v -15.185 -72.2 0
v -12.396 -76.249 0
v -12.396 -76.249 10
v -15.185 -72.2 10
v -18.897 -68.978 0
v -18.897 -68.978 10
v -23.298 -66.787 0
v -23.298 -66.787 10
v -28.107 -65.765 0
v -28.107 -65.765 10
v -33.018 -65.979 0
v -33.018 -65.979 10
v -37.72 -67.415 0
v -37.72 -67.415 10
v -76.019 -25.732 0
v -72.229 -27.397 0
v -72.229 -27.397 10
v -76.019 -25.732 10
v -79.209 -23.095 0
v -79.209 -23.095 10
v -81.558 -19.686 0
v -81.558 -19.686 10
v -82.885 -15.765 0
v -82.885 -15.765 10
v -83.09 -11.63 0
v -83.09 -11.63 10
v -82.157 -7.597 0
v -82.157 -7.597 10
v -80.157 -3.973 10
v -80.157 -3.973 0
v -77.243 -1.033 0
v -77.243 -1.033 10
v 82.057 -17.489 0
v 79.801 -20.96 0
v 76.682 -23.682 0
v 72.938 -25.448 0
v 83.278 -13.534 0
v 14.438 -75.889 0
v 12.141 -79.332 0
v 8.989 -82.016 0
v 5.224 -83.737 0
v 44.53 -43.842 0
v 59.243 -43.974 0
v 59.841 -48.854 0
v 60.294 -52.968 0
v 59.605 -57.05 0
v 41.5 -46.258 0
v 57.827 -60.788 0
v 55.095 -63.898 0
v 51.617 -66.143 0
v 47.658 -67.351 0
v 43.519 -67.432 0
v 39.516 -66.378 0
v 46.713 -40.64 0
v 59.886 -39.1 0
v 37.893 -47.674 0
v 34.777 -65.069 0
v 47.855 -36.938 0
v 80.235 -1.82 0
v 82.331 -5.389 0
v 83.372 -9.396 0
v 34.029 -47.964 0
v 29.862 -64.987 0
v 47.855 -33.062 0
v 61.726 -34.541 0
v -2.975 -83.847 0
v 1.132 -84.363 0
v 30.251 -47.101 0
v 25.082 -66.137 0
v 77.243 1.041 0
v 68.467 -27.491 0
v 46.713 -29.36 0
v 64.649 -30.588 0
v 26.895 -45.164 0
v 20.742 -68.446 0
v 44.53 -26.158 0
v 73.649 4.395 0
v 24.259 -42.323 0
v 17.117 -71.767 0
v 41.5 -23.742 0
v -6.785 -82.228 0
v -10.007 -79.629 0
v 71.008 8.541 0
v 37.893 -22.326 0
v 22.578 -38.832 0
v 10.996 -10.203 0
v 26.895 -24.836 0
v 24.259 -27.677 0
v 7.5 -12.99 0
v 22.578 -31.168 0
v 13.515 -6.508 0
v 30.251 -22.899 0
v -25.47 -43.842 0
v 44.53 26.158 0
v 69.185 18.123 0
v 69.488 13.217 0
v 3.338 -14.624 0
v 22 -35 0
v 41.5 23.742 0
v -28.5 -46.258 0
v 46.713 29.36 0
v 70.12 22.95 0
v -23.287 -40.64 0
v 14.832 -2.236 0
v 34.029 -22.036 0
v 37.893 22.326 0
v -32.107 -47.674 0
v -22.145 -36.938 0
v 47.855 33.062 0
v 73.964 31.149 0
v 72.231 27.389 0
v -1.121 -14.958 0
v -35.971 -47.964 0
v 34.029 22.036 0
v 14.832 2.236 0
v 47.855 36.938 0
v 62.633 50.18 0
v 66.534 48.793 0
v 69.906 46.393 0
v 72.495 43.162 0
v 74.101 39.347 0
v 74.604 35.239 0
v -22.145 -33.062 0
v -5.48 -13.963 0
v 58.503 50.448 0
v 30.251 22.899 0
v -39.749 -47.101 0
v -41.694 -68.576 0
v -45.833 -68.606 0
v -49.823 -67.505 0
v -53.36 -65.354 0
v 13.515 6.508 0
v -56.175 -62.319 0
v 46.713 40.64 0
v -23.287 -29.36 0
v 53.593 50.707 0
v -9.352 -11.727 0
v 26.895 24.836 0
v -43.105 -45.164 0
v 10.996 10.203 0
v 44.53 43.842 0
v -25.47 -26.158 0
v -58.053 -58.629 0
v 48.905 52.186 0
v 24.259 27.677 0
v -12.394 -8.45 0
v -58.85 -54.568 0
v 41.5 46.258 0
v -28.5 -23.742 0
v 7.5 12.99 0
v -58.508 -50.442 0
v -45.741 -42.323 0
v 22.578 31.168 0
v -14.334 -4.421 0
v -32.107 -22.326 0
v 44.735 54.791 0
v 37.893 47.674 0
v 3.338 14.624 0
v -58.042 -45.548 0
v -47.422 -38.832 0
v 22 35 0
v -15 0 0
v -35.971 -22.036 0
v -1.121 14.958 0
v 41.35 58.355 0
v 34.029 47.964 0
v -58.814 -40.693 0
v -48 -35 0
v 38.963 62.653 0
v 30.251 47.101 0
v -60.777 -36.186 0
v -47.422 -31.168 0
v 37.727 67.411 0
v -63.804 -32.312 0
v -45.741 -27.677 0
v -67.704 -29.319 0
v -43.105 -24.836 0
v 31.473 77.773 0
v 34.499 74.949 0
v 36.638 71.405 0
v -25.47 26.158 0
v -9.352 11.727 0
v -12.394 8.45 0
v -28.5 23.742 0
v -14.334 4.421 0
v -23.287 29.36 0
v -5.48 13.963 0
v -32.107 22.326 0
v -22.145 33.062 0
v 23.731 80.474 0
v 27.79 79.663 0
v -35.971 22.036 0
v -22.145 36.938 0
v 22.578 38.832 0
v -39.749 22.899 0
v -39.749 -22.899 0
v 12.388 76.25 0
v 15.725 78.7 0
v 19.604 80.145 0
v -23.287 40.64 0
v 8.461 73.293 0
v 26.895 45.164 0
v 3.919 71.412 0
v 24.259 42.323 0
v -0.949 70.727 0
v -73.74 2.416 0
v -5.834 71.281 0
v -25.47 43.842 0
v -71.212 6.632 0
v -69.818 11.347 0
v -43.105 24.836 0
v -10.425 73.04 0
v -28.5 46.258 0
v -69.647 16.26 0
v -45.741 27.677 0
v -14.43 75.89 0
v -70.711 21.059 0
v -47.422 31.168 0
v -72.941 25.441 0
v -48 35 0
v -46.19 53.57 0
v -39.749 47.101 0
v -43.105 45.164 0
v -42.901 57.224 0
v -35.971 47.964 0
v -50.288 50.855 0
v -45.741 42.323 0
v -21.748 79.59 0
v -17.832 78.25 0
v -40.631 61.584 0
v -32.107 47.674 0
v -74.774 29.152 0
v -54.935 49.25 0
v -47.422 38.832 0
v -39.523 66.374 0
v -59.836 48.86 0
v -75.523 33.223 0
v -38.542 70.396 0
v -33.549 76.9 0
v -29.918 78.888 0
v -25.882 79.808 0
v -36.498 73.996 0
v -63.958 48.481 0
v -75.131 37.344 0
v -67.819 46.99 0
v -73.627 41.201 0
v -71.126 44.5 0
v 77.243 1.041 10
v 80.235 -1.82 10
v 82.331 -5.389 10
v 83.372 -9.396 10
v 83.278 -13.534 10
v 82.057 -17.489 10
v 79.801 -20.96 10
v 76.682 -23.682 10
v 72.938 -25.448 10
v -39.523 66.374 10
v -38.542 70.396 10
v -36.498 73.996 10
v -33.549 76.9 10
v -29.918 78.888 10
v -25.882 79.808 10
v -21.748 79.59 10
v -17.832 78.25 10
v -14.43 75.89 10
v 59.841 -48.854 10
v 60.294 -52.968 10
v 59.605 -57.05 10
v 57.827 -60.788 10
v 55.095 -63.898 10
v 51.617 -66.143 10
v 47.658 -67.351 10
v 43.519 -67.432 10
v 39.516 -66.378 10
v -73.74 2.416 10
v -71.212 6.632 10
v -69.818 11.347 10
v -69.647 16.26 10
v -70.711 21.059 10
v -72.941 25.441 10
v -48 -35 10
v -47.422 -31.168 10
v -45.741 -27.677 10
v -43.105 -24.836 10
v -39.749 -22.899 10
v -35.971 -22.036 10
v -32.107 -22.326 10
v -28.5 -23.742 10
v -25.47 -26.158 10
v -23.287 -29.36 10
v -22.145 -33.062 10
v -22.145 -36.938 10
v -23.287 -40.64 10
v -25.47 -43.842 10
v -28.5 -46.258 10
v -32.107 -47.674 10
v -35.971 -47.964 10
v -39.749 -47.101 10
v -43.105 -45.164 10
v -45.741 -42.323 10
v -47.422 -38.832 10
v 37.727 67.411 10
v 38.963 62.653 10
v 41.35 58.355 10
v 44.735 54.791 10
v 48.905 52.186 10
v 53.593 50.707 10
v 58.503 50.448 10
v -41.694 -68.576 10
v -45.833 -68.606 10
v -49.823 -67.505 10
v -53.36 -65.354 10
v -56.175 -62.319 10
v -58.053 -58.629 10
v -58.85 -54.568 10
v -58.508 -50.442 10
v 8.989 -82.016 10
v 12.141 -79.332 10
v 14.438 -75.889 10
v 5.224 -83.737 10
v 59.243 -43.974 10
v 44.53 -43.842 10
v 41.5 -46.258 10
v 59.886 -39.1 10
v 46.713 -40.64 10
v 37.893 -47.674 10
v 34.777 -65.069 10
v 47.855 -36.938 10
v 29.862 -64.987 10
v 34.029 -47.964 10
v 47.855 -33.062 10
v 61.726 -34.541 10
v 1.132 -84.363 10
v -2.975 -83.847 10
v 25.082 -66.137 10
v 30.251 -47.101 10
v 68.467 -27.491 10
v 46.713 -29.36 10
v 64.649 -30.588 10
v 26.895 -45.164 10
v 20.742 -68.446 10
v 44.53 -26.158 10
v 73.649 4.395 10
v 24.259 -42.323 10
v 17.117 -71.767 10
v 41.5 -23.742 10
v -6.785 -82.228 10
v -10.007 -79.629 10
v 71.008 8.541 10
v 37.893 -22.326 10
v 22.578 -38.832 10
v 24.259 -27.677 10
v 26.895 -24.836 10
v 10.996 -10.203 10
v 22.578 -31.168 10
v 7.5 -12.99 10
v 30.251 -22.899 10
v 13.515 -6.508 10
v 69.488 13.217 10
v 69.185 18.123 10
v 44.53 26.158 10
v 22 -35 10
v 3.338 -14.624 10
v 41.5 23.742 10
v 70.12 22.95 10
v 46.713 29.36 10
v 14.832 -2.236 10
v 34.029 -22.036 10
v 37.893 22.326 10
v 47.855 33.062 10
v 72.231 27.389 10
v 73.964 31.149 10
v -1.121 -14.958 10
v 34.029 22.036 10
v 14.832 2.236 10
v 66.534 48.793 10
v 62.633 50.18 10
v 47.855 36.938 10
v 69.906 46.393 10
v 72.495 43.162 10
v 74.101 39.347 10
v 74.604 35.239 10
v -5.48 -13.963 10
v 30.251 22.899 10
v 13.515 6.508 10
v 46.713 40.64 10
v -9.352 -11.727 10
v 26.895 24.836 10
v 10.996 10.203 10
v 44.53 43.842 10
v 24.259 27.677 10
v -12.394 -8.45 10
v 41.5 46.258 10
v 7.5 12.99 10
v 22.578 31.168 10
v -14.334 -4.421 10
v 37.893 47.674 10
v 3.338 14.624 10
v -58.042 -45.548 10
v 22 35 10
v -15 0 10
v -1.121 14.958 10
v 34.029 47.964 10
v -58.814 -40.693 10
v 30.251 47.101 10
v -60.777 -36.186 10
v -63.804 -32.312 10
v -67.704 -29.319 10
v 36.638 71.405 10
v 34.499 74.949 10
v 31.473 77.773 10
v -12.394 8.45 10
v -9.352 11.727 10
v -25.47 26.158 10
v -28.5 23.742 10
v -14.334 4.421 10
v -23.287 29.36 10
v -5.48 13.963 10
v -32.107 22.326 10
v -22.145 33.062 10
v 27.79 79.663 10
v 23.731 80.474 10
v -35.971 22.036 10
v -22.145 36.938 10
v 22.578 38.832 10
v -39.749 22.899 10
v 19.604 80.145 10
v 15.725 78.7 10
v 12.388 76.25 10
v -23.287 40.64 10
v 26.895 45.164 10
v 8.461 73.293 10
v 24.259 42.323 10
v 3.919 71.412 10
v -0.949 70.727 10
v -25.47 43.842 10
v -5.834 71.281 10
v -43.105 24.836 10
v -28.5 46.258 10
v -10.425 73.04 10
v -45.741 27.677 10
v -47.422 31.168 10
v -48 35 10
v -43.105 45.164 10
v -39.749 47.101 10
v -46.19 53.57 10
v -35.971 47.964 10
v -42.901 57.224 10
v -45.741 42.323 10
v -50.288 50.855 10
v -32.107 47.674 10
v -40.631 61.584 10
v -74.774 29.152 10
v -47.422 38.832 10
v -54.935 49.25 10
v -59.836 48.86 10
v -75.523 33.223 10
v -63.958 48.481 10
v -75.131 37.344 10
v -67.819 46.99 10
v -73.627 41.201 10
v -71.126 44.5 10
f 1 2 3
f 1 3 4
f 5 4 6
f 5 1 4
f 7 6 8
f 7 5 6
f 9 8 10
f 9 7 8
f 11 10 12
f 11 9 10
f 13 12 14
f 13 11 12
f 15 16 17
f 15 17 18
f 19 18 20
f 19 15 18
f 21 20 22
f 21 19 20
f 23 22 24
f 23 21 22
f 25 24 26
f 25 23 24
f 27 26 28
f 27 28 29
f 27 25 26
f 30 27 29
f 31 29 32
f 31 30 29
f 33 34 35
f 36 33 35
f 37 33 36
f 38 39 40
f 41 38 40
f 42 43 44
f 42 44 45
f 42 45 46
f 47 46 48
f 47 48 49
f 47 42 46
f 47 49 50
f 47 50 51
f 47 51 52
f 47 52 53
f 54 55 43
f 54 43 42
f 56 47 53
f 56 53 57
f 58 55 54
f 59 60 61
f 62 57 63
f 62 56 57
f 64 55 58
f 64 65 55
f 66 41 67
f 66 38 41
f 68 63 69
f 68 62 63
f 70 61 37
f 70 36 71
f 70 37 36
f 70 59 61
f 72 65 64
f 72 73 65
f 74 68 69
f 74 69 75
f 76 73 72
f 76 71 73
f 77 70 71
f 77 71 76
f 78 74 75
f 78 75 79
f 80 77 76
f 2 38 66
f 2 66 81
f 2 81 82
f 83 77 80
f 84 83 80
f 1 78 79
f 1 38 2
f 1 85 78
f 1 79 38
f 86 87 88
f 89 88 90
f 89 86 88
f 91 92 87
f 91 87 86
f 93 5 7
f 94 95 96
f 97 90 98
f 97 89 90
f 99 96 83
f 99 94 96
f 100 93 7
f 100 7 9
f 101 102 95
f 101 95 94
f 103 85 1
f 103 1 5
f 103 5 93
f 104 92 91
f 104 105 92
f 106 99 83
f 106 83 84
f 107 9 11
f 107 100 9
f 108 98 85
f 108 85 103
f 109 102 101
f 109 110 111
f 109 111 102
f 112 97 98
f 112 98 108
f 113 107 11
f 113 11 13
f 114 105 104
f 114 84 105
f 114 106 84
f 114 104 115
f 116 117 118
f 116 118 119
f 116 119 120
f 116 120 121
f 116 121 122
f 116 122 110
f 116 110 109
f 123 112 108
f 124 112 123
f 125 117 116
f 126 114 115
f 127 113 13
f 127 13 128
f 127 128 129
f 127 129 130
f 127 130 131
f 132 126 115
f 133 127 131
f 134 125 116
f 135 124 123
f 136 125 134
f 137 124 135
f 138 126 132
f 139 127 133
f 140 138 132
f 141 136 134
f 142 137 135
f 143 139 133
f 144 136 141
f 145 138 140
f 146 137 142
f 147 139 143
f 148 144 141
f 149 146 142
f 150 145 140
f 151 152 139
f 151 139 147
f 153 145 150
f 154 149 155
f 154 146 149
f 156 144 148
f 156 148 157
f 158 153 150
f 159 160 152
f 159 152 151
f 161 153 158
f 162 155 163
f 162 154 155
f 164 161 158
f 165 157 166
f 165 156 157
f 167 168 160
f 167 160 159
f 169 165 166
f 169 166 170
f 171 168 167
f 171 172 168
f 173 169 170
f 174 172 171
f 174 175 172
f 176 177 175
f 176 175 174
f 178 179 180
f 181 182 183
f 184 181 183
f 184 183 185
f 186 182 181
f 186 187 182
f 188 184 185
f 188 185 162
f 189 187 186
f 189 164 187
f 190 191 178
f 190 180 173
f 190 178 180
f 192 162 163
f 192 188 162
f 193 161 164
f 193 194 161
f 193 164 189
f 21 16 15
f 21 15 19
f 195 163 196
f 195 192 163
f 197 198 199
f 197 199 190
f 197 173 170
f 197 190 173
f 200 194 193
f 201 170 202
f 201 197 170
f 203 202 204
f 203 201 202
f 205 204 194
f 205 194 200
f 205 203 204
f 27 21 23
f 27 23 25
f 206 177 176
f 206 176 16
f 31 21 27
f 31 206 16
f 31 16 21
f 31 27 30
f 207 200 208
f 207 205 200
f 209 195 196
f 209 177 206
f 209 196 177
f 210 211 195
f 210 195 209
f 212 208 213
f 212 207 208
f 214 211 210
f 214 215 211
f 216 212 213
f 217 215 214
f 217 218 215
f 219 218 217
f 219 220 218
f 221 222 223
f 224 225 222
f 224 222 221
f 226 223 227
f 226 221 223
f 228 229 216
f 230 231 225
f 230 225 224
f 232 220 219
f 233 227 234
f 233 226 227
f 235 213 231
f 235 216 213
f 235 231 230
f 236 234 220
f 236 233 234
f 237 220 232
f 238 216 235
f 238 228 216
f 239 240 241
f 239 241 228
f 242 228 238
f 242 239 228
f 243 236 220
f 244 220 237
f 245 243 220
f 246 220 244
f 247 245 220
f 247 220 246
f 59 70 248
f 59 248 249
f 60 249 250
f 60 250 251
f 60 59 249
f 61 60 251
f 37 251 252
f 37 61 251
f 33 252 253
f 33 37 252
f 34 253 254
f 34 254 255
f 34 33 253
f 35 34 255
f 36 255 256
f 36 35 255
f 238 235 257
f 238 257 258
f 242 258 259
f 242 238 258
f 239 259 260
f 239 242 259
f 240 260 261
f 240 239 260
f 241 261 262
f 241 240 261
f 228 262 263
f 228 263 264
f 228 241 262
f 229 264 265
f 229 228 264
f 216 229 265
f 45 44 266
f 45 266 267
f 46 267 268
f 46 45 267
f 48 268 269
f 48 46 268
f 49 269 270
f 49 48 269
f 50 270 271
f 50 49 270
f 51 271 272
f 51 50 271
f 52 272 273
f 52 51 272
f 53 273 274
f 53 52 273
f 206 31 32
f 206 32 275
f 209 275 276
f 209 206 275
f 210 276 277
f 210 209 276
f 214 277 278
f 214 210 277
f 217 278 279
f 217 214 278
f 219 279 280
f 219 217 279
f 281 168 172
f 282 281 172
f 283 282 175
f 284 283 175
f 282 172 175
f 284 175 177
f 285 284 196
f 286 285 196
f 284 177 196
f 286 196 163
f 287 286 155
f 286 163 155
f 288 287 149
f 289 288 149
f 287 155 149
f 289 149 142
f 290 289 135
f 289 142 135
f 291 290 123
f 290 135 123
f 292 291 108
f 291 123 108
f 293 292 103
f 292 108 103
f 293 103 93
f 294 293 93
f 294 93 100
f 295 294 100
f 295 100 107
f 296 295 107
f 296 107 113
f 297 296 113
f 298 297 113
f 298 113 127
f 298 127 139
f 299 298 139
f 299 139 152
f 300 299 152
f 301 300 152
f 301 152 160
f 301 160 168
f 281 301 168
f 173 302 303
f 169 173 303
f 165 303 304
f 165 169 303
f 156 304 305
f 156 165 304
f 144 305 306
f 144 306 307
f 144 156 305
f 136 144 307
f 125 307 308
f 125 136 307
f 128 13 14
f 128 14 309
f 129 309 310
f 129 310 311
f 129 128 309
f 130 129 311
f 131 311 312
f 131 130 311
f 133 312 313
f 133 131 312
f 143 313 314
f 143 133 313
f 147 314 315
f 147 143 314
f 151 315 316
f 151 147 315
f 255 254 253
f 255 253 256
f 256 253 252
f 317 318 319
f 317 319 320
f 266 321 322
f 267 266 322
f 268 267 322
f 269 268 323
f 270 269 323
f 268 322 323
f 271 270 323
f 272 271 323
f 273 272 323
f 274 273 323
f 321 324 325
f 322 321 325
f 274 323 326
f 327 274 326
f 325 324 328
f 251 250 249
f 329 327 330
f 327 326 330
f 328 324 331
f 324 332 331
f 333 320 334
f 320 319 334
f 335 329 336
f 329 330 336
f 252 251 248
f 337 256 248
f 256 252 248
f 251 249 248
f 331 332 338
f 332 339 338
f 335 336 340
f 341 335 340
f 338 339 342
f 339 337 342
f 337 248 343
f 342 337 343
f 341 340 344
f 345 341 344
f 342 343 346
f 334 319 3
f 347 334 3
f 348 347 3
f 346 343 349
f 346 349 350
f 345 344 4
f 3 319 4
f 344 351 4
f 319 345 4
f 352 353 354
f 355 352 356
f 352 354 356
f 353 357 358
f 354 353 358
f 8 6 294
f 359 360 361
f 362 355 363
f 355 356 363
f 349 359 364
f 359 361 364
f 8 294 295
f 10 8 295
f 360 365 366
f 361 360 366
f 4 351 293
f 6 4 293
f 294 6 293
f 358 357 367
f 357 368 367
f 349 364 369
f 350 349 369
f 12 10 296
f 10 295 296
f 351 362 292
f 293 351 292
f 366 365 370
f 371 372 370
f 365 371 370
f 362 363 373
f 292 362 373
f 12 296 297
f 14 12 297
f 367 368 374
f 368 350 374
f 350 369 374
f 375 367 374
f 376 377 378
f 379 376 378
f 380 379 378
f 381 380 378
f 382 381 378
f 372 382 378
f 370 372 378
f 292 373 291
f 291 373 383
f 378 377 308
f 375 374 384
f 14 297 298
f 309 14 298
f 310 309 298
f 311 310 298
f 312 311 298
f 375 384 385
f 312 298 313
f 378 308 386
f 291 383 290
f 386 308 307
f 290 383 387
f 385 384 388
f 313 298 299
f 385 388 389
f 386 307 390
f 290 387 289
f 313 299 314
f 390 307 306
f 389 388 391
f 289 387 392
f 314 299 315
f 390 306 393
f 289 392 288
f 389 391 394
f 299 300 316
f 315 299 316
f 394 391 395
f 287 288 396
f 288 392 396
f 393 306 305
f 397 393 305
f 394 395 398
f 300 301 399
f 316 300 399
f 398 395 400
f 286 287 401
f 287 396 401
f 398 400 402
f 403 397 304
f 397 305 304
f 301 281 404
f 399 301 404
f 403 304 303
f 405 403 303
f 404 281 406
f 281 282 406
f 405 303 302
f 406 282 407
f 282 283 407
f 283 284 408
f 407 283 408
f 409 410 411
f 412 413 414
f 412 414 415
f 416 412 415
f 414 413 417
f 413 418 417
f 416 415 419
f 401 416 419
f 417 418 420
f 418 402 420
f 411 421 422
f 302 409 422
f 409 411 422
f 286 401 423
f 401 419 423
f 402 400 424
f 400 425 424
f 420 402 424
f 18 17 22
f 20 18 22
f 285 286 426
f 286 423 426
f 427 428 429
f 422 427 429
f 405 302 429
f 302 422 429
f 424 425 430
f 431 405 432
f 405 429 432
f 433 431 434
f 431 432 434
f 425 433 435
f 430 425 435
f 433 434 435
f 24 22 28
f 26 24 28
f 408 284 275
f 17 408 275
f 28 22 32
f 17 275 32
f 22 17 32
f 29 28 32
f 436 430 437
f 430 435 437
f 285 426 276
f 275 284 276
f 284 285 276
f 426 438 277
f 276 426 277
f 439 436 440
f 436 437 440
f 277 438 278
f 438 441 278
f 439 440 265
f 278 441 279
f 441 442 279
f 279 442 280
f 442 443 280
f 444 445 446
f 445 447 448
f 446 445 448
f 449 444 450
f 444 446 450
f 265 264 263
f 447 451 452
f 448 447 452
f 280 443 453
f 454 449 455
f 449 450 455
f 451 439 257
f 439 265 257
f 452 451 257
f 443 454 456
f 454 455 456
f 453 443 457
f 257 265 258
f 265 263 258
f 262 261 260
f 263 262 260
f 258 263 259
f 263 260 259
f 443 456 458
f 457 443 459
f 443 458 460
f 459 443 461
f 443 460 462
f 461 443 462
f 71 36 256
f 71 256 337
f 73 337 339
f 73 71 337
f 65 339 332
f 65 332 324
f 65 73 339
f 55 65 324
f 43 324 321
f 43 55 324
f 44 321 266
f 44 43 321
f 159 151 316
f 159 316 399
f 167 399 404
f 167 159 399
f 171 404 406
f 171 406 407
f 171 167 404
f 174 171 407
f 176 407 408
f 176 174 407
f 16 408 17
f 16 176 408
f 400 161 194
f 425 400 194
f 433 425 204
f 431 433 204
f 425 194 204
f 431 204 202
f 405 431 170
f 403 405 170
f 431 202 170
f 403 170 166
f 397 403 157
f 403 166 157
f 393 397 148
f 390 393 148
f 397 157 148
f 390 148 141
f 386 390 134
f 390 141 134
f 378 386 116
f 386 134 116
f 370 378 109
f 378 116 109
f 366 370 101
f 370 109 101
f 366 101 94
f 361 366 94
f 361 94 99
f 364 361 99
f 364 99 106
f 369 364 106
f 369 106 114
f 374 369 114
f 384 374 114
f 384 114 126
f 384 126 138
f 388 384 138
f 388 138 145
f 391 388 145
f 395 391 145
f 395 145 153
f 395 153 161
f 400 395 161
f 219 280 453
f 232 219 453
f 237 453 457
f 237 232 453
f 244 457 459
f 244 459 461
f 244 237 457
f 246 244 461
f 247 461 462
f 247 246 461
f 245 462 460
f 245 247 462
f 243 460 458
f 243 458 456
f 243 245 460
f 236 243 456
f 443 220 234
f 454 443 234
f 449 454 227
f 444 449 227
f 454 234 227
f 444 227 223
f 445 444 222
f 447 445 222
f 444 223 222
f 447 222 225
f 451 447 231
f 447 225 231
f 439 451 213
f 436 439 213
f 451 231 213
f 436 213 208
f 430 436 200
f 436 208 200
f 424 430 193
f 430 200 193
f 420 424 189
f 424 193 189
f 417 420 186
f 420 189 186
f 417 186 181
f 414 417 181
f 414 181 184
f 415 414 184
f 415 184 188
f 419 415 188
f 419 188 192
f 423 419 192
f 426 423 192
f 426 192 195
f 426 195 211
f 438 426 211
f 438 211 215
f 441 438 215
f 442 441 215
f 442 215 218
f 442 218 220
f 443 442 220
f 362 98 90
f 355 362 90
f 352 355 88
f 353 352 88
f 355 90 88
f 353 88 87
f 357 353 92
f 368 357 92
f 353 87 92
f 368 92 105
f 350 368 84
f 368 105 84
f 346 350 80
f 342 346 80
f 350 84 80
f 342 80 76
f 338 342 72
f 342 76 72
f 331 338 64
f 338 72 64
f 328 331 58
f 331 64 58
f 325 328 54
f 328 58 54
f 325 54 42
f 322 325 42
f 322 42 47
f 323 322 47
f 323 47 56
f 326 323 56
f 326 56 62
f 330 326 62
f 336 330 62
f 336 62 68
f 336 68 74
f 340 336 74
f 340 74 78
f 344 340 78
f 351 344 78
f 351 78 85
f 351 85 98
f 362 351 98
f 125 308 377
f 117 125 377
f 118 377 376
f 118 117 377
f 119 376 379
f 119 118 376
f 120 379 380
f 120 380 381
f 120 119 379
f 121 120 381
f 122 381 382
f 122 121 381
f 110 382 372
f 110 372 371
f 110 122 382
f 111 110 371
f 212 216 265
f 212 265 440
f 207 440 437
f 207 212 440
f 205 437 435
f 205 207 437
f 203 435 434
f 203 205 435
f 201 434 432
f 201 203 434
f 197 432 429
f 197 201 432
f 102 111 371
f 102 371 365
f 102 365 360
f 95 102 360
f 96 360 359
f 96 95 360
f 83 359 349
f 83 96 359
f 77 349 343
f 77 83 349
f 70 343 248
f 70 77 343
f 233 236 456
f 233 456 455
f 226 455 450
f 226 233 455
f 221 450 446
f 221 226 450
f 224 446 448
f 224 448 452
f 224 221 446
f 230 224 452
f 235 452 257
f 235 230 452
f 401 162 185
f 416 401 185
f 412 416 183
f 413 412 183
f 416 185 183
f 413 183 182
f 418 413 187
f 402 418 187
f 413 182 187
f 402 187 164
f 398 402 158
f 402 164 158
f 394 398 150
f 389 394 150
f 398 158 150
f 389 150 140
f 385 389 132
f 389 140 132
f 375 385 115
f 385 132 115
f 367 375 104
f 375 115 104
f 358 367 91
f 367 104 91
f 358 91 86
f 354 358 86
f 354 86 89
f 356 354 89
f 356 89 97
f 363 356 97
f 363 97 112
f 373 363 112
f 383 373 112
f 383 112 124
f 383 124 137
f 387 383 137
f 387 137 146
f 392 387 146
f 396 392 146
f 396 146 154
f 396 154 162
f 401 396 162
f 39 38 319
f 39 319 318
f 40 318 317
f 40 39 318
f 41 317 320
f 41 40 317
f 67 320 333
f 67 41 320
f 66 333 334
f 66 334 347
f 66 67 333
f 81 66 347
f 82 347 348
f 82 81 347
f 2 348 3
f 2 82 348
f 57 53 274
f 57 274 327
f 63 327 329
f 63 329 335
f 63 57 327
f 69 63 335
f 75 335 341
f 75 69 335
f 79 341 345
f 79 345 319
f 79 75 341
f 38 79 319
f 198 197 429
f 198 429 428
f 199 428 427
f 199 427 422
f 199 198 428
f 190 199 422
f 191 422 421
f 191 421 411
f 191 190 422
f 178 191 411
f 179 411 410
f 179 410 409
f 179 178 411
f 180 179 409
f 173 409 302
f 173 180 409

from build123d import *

# Parameters (mm, degrees)
BOSS_EXTRUDE1_DEPTH = 10
SKETCH3_R           = 13
SKETCH3_R_2         = 15
CUT_EXTRUDE1_DEPTH  = 120.101165428


with BuildPart() as part:
    # Sketch1 → Boss-Extrude1 (new body)
    with BuildSketch(Plane.XY):
        with BuildLine():
            ThreePointArc((-14.43044528, 75.890215107), (-0.949427503, 70.727267405), (12.388145038, 76.250222049))
            ThreePointArc((12.388145038, 76.250222049), (27.789798404, 79.662981363), (37.726927549, 67.410988998))
            ThreePointArc((37.726927549, 67.410988998), (44.735307492, 54.790510408), (58.502567636, 50.44811275))
            ThreePointArc((58.502567636, 50.44811275), (72.494598013, 43.162446106), (72.23145169, 27.389411947))
            ThreePointArc((72.23145169, 27.389411947), (69.487894935, 13.216664662), (77.242988653, 1.040770827))
            ThreePointArc((77.242988653, 1.040770827), (83.278369525, -13.534277382), (72.938076822, -25.447975353))
            ThreePointArc((72.938076822, -25.447975353), (61.726324065, -34.541405366), (59.84055682, -48.853559333))
            ThreePointArc((59.84055682, -48.853559333), (55.0952664, -63.898162065), (39.516165192, -66.377972163))
            ThreePointArc((39.516165192, -66.377972163), (25.082320154, -66.137167939), (14.438063397, -75.888766134))
            ThreePointArc((14.438063397, -75.888766134), (1.13247581, -84.36338657), (-12.395799304, -76.248978089))
            ThreePointArc((-12.395799304, -76.248978089), (-23.297980116, -66.7866146), (-37.720160351, -67.414775851))
            ThreePointArc((-37.720160351, -67.414775851), (-53.360212797, -65.354044903), (-58.507631542, -50.442239754))
            ThreePointArc((-58.507631542, -50.442239754), (-60.776896562, -36.185862039), (-72.228701857, -27.396662716))
            ThreePointArc((-72.228701857, -27.396662716), (-82.885064803, -15.764819298), (-77.243092741, -1.033016835))
            ThreePointArc((-77.243092741, -1.033016835), (-69.817627646, 11.34665753), (-72.940631032, 25.440653384))
            ThreePointArc((-72.940631032, 25.440653384), (-73.627073824, 41.200940464), (-59.835652386, 48.859566142))
            ThreePointArc((-59.835652386, 48.859566142), (-46.189914818, 53.569949938), (-39.522828302, 66.374005024))
            ThreePointArc((-39.522828302, 66.374005024), (-29.918156728, 78.888322285), (-14.43044528, 75.890215107))
        make_face()
    extrude(amount=BOSS_EXTRUDE1_DEPTH)

    # Sketch3 → Cut-Extrude1 (cut, through all)
    with BuildSketch(Plane(origin=(0, 0, 0), x_dir=(-1, 0, 0), z_dir=(0, 0, -1))):
        with Locations((-35, 35)):
            Circle(SKETCH3_R)
        with Locations((35, 35)):
            Circle(SKETCH3_R)
        with Locations((35, -35)):
            Circle(SKETCH3_R)
        with Locations((-35, -35)):
            Circle(SKETCH3_R)
        Circle(SKETCH3_R_2)
    extrude(amount=-CUT_EXTRUDE1_DEPTH, mode=Mode.SUBTRACT)


solid = part.part
